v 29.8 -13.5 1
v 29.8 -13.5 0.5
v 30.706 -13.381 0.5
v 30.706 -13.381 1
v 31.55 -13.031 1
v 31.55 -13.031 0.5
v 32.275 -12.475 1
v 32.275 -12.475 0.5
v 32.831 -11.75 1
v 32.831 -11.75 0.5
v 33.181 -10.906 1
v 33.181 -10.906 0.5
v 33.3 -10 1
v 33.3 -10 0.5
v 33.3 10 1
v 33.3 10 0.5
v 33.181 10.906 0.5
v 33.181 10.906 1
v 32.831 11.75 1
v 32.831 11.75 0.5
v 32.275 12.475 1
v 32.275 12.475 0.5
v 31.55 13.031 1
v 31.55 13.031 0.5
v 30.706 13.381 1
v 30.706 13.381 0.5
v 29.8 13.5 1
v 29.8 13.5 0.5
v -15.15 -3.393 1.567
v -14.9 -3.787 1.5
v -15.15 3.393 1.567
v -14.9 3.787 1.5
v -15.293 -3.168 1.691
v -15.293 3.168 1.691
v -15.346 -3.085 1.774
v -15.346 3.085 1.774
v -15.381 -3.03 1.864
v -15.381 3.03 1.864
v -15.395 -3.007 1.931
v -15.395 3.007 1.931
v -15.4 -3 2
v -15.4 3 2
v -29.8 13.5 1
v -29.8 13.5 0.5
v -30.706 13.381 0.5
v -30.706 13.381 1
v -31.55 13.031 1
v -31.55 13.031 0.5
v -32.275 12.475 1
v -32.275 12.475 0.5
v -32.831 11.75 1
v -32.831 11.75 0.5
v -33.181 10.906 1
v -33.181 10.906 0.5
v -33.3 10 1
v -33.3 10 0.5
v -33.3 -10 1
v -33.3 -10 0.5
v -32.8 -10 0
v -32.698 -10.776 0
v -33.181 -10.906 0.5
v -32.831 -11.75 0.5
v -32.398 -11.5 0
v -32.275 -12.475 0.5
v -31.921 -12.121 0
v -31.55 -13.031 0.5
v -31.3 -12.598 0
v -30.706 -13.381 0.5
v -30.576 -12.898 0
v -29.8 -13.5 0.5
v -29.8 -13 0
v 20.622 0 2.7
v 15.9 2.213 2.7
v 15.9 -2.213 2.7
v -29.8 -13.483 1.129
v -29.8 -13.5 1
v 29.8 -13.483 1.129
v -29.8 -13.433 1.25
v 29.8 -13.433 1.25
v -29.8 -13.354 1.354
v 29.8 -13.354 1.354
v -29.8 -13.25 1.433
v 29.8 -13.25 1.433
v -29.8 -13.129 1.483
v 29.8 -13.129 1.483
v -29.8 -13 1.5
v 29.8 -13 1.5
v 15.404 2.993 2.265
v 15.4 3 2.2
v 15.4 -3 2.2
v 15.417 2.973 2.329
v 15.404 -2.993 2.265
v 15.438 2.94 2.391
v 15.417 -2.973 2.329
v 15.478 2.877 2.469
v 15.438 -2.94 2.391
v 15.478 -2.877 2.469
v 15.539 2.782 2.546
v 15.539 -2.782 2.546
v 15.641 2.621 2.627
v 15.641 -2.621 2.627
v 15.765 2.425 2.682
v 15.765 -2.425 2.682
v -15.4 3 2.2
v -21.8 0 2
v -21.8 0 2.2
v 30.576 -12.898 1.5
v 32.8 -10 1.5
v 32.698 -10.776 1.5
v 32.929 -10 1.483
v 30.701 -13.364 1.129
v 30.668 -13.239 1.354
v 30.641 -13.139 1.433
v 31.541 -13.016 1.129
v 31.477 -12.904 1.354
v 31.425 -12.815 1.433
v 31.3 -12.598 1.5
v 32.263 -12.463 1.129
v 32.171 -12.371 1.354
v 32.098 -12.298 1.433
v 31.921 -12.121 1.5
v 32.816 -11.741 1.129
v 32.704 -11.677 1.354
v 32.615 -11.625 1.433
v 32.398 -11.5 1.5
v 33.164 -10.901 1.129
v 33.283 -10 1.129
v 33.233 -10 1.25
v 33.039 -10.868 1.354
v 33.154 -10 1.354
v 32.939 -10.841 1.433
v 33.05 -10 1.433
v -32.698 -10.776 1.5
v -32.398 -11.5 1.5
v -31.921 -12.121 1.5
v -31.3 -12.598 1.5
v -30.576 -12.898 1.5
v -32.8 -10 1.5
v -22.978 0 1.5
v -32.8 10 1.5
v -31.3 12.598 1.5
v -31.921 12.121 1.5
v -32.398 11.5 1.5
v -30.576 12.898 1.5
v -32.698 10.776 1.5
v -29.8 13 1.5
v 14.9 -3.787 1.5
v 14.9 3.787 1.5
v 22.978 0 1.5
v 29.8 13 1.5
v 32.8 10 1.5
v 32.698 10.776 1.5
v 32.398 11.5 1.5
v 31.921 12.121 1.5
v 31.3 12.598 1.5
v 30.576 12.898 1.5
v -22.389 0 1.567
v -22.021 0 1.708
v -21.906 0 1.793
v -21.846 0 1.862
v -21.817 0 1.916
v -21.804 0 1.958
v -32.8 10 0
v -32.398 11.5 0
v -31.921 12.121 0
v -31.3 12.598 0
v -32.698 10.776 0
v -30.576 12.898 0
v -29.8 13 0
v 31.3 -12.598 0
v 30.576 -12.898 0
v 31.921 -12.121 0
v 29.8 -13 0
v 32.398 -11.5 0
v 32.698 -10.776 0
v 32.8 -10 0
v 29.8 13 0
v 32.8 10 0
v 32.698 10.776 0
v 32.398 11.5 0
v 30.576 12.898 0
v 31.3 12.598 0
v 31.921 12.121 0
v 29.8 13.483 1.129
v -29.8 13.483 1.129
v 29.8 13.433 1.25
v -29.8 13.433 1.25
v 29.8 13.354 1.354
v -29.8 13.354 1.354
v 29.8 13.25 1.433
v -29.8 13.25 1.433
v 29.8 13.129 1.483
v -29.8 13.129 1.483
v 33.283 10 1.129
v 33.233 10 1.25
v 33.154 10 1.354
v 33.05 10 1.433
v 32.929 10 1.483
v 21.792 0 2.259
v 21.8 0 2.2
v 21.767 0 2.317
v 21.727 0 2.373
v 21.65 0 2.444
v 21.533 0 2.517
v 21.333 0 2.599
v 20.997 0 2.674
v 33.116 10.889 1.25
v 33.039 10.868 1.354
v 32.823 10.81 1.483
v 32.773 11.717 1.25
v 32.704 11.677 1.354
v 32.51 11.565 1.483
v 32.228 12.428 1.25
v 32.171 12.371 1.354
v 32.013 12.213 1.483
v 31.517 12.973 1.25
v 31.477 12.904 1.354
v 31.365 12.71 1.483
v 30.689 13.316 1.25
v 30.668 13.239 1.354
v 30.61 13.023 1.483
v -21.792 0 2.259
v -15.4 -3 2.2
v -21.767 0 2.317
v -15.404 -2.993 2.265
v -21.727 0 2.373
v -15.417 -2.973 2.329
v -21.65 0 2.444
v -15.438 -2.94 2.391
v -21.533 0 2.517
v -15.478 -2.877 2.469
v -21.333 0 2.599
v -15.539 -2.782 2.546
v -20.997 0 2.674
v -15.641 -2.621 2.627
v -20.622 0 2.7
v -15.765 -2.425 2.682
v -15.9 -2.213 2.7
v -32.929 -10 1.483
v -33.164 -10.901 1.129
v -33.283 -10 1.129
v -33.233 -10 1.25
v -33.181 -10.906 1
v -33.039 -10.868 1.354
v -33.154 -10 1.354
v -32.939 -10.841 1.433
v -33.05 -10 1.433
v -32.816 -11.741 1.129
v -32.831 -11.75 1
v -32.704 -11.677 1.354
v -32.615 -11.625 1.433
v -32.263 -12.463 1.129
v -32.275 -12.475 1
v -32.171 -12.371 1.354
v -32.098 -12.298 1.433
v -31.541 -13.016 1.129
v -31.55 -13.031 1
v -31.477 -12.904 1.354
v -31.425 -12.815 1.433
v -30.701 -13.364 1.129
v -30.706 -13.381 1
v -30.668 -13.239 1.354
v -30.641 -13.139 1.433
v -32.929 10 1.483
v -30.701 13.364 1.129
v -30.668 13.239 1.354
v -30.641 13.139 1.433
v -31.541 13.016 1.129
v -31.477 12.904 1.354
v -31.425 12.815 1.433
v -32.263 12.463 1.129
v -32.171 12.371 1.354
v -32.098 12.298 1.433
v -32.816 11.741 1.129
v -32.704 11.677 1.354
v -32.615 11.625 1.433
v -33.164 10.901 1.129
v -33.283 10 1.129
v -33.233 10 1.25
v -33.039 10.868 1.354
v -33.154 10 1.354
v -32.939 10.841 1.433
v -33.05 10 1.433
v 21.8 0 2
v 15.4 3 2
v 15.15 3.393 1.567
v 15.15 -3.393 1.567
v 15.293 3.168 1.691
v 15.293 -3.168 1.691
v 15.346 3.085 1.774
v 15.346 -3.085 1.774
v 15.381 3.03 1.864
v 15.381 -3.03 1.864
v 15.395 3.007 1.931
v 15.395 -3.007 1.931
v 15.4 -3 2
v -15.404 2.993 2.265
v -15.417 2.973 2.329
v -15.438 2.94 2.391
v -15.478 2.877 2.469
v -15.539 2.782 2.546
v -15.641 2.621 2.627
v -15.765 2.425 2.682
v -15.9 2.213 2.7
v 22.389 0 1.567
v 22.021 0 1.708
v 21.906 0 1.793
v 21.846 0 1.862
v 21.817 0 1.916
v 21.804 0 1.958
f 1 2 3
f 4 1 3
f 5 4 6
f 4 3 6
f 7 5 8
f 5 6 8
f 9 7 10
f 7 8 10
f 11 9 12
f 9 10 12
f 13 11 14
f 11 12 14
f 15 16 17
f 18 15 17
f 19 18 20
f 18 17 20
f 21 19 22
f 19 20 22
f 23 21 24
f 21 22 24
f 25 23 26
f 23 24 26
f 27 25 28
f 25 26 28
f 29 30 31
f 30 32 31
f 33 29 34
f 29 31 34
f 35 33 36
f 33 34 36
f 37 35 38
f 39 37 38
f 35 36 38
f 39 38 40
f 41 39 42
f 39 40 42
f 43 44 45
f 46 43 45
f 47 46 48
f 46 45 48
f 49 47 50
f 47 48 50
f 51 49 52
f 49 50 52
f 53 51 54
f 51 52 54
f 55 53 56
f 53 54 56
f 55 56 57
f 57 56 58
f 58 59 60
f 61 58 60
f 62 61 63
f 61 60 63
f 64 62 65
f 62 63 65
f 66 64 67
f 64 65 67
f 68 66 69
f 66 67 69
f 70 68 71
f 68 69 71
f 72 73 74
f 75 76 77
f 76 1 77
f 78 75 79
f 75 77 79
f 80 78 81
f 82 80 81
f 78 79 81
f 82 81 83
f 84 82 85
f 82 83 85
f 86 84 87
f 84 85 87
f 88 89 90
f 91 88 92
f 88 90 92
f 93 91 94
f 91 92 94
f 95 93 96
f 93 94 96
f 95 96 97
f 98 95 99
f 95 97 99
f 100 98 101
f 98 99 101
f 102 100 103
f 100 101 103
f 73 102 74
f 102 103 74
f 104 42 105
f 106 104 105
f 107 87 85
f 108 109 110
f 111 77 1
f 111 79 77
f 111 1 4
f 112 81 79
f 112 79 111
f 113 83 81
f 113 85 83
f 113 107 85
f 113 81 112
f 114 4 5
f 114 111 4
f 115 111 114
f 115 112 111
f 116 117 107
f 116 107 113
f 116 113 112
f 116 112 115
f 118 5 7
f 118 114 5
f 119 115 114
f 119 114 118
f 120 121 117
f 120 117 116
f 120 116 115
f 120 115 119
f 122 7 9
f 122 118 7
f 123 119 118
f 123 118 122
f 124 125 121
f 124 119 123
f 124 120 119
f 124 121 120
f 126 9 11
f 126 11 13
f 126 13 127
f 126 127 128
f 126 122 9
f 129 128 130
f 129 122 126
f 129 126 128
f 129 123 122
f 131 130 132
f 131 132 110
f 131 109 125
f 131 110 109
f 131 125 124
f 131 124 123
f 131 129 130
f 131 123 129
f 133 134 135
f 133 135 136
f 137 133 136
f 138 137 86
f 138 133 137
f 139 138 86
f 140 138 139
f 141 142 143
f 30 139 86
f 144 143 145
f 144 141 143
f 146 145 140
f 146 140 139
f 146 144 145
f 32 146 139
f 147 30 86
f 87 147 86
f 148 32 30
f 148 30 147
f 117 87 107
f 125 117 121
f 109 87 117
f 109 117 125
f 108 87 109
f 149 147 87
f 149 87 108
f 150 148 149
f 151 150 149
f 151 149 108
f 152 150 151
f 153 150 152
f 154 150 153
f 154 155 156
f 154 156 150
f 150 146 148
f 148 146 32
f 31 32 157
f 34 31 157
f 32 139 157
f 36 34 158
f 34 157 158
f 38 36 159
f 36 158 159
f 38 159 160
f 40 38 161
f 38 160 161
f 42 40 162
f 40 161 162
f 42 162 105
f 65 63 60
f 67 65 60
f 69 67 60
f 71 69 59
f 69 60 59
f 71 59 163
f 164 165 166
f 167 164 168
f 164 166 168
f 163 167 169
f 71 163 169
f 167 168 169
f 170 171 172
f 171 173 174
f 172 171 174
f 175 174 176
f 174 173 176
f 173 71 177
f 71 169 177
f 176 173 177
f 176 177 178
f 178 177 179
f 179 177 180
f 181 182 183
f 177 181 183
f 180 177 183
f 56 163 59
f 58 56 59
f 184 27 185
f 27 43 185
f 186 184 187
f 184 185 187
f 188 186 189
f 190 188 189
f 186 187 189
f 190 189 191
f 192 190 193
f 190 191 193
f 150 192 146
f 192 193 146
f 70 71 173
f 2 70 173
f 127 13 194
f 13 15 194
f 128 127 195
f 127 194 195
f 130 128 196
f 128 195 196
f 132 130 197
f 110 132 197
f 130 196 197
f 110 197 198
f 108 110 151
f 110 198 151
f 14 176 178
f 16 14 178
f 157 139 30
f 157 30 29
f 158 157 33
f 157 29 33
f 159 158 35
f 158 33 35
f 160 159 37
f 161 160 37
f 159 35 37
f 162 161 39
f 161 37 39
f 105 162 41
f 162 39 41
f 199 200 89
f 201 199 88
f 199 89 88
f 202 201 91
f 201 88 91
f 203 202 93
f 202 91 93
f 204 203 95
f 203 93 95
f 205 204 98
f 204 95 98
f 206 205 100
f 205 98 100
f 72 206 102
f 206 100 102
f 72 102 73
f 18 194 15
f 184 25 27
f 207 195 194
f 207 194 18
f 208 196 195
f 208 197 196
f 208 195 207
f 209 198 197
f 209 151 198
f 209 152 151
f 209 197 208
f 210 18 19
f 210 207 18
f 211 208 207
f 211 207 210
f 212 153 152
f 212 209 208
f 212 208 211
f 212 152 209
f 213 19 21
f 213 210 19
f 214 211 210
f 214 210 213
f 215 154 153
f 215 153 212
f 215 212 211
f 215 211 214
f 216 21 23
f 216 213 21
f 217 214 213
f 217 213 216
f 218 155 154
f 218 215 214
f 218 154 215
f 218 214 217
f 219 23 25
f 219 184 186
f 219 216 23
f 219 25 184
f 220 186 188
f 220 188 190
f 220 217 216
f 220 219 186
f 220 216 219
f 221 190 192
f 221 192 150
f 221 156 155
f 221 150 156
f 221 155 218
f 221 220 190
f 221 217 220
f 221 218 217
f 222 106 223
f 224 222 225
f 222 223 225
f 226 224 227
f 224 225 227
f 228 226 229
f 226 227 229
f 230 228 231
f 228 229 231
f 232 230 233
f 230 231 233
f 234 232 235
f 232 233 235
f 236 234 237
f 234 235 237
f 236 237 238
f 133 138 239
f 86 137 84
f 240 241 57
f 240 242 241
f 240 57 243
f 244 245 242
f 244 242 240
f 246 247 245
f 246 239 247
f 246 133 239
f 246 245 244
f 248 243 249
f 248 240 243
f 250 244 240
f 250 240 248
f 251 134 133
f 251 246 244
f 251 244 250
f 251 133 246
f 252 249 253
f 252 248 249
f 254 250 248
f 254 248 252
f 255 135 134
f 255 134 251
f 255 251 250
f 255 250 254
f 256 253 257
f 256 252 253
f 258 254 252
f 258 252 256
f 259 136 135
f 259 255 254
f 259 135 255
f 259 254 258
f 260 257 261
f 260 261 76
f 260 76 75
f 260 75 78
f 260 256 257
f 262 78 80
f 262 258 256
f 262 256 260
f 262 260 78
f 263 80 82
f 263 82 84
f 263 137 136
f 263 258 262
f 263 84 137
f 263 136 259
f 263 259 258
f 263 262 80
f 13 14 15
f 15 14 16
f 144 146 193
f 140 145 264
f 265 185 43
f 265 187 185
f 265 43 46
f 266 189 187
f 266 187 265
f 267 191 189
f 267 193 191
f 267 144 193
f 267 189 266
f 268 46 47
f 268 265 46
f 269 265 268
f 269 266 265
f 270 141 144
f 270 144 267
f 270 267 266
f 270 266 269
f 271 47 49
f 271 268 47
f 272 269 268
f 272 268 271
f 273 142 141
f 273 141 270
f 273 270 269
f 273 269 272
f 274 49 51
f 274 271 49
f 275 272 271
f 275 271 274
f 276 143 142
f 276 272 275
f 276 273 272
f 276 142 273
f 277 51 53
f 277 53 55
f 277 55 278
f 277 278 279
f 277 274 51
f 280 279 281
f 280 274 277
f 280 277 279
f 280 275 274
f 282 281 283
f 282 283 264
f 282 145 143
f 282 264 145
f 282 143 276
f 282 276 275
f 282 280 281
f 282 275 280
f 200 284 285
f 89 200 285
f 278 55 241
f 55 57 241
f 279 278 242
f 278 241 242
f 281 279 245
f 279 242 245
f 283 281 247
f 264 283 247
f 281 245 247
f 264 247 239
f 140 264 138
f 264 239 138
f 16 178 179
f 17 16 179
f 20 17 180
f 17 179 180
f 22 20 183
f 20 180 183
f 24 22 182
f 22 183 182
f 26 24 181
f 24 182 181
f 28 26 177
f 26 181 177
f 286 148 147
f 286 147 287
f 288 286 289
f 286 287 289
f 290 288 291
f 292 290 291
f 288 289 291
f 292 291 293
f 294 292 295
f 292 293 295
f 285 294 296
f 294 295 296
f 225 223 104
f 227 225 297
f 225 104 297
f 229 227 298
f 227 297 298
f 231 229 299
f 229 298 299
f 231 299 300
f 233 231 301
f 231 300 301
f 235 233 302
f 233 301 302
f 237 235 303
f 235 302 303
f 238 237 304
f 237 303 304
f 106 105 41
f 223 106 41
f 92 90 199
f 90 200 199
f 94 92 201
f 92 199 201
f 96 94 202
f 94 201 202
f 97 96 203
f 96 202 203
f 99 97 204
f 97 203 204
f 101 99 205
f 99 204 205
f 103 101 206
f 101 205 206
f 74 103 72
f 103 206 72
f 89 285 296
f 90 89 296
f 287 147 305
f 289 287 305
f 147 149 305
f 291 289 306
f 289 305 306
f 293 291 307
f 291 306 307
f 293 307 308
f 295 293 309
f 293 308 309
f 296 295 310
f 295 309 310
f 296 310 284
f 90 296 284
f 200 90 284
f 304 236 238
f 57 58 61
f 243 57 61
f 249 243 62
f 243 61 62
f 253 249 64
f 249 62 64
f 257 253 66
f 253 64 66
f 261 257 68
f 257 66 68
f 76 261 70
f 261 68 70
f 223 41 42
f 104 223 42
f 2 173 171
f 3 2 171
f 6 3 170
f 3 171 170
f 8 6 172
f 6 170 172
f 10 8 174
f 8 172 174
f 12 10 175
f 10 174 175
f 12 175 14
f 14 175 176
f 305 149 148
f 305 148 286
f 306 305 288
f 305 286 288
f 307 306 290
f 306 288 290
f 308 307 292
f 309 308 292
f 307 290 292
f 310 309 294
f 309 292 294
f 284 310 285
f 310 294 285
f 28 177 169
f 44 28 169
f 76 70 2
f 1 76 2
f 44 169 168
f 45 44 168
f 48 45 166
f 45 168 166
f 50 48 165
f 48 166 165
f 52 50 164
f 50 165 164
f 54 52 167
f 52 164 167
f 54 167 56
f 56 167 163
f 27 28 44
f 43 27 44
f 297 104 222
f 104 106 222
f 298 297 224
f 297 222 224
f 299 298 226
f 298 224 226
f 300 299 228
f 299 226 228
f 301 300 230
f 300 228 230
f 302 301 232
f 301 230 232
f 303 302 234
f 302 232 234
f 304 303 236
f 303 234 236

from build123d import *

# Parameters (mm, degrees)
F1_DEPTH = 1.5
F3_DEPTH = 1.2
F4_SIZE  = 0.5
F5_R     = 0.5


with BuildPart() as f1:
    # F0 (on Top) → F1 (new body)
    with BuildSketch(Plane.XY):
        with BuildLine():
            Line((-29.8, -13.5), (29.8, -13.5))
            ThreePointArc((29.8, -13.5), (32.274874, -12.474874), (33.3, -10))
            Line((33.3, -10), (33.3, 10))
            ThreePointArc((33.3, 10), (32.274874, 12.474874), (29.8, 13.5))
            Line((29.8, 13.5), (-29.8, 13.5))
            ThreePointArc((-29.8, 13.5), (-32.274874, 12.474874), (-33.3, 10))
            Line((-33.3, 10), (-33.3, -10))
            ThreePointArc((-33.3, -10), (-32.274874, -12.474874), (-29.8, -13.5))
        make_face()
    extrude(amount=F1_DEPTH)

    # F2 (on face) → F3 (join)
    with BuildSketch(Plane.XY.offset(1.5)):
        Polygon((-15.4, -3), (-15.4, 3), (-21.8, 0), align=None)
        Polygon((21.8, 0), (15.4, 3), (15.4, -3), align=None)
    extrude(amount=F3_DEPTH)

    # F4
    f4_edges = [f1.edges().sort_by_distance(p)[0] for p in [
        (0, -13.5, 0),
        (32.274874, -12.474874, 0),
        (33.3, 0, 0),
        (32.274874, 12.474874, 0),
        (0, 13.5, 0),
        (-32.274874, 12.474874, 0),
        (-33.3, 0, 0),
        (-32.274874, -12.474874, 0),
    ]]
    chamfer(f4_edges, length=F4_SIZE)

    # F5
    f5_edges = [f1.edges().sort_by_distance(p)[0] for p in [
        (-15.4, 0, 2.7),
        (-18.6, 1.5, 2.7),
        (-18.6, -1.5, 2.7),
        (18.6, 1.5, 2.7),
        (15.4, 0, 2.7),
        (18.6, -1.5, 2.7),
        (0, -13.5, 1.5),
        (-32.274874, -12.474874, 1.5),
        (32.274874, -12.474874, 1.5),
        (-33.3, 0, 1.5),
        (33.3, 0, 1.5),
        (-32.274874, 12.474874, 1.5),
        (32.274874, 12.474874, 1.5),
        (0, 13.5, 1.5),
        (-15.4, 0, 1.5),
        (-18.6, 1.5, 1.5),
        (-18.6, -1.5, 1.5),
        (18.6, 1.5, 1.5),
        (15.4, 0, 1.5),
        (18.6, -1.5, 1.5),
    ]]
    fillet(f5_edges, radius=F5_R)


solid = f1.part
